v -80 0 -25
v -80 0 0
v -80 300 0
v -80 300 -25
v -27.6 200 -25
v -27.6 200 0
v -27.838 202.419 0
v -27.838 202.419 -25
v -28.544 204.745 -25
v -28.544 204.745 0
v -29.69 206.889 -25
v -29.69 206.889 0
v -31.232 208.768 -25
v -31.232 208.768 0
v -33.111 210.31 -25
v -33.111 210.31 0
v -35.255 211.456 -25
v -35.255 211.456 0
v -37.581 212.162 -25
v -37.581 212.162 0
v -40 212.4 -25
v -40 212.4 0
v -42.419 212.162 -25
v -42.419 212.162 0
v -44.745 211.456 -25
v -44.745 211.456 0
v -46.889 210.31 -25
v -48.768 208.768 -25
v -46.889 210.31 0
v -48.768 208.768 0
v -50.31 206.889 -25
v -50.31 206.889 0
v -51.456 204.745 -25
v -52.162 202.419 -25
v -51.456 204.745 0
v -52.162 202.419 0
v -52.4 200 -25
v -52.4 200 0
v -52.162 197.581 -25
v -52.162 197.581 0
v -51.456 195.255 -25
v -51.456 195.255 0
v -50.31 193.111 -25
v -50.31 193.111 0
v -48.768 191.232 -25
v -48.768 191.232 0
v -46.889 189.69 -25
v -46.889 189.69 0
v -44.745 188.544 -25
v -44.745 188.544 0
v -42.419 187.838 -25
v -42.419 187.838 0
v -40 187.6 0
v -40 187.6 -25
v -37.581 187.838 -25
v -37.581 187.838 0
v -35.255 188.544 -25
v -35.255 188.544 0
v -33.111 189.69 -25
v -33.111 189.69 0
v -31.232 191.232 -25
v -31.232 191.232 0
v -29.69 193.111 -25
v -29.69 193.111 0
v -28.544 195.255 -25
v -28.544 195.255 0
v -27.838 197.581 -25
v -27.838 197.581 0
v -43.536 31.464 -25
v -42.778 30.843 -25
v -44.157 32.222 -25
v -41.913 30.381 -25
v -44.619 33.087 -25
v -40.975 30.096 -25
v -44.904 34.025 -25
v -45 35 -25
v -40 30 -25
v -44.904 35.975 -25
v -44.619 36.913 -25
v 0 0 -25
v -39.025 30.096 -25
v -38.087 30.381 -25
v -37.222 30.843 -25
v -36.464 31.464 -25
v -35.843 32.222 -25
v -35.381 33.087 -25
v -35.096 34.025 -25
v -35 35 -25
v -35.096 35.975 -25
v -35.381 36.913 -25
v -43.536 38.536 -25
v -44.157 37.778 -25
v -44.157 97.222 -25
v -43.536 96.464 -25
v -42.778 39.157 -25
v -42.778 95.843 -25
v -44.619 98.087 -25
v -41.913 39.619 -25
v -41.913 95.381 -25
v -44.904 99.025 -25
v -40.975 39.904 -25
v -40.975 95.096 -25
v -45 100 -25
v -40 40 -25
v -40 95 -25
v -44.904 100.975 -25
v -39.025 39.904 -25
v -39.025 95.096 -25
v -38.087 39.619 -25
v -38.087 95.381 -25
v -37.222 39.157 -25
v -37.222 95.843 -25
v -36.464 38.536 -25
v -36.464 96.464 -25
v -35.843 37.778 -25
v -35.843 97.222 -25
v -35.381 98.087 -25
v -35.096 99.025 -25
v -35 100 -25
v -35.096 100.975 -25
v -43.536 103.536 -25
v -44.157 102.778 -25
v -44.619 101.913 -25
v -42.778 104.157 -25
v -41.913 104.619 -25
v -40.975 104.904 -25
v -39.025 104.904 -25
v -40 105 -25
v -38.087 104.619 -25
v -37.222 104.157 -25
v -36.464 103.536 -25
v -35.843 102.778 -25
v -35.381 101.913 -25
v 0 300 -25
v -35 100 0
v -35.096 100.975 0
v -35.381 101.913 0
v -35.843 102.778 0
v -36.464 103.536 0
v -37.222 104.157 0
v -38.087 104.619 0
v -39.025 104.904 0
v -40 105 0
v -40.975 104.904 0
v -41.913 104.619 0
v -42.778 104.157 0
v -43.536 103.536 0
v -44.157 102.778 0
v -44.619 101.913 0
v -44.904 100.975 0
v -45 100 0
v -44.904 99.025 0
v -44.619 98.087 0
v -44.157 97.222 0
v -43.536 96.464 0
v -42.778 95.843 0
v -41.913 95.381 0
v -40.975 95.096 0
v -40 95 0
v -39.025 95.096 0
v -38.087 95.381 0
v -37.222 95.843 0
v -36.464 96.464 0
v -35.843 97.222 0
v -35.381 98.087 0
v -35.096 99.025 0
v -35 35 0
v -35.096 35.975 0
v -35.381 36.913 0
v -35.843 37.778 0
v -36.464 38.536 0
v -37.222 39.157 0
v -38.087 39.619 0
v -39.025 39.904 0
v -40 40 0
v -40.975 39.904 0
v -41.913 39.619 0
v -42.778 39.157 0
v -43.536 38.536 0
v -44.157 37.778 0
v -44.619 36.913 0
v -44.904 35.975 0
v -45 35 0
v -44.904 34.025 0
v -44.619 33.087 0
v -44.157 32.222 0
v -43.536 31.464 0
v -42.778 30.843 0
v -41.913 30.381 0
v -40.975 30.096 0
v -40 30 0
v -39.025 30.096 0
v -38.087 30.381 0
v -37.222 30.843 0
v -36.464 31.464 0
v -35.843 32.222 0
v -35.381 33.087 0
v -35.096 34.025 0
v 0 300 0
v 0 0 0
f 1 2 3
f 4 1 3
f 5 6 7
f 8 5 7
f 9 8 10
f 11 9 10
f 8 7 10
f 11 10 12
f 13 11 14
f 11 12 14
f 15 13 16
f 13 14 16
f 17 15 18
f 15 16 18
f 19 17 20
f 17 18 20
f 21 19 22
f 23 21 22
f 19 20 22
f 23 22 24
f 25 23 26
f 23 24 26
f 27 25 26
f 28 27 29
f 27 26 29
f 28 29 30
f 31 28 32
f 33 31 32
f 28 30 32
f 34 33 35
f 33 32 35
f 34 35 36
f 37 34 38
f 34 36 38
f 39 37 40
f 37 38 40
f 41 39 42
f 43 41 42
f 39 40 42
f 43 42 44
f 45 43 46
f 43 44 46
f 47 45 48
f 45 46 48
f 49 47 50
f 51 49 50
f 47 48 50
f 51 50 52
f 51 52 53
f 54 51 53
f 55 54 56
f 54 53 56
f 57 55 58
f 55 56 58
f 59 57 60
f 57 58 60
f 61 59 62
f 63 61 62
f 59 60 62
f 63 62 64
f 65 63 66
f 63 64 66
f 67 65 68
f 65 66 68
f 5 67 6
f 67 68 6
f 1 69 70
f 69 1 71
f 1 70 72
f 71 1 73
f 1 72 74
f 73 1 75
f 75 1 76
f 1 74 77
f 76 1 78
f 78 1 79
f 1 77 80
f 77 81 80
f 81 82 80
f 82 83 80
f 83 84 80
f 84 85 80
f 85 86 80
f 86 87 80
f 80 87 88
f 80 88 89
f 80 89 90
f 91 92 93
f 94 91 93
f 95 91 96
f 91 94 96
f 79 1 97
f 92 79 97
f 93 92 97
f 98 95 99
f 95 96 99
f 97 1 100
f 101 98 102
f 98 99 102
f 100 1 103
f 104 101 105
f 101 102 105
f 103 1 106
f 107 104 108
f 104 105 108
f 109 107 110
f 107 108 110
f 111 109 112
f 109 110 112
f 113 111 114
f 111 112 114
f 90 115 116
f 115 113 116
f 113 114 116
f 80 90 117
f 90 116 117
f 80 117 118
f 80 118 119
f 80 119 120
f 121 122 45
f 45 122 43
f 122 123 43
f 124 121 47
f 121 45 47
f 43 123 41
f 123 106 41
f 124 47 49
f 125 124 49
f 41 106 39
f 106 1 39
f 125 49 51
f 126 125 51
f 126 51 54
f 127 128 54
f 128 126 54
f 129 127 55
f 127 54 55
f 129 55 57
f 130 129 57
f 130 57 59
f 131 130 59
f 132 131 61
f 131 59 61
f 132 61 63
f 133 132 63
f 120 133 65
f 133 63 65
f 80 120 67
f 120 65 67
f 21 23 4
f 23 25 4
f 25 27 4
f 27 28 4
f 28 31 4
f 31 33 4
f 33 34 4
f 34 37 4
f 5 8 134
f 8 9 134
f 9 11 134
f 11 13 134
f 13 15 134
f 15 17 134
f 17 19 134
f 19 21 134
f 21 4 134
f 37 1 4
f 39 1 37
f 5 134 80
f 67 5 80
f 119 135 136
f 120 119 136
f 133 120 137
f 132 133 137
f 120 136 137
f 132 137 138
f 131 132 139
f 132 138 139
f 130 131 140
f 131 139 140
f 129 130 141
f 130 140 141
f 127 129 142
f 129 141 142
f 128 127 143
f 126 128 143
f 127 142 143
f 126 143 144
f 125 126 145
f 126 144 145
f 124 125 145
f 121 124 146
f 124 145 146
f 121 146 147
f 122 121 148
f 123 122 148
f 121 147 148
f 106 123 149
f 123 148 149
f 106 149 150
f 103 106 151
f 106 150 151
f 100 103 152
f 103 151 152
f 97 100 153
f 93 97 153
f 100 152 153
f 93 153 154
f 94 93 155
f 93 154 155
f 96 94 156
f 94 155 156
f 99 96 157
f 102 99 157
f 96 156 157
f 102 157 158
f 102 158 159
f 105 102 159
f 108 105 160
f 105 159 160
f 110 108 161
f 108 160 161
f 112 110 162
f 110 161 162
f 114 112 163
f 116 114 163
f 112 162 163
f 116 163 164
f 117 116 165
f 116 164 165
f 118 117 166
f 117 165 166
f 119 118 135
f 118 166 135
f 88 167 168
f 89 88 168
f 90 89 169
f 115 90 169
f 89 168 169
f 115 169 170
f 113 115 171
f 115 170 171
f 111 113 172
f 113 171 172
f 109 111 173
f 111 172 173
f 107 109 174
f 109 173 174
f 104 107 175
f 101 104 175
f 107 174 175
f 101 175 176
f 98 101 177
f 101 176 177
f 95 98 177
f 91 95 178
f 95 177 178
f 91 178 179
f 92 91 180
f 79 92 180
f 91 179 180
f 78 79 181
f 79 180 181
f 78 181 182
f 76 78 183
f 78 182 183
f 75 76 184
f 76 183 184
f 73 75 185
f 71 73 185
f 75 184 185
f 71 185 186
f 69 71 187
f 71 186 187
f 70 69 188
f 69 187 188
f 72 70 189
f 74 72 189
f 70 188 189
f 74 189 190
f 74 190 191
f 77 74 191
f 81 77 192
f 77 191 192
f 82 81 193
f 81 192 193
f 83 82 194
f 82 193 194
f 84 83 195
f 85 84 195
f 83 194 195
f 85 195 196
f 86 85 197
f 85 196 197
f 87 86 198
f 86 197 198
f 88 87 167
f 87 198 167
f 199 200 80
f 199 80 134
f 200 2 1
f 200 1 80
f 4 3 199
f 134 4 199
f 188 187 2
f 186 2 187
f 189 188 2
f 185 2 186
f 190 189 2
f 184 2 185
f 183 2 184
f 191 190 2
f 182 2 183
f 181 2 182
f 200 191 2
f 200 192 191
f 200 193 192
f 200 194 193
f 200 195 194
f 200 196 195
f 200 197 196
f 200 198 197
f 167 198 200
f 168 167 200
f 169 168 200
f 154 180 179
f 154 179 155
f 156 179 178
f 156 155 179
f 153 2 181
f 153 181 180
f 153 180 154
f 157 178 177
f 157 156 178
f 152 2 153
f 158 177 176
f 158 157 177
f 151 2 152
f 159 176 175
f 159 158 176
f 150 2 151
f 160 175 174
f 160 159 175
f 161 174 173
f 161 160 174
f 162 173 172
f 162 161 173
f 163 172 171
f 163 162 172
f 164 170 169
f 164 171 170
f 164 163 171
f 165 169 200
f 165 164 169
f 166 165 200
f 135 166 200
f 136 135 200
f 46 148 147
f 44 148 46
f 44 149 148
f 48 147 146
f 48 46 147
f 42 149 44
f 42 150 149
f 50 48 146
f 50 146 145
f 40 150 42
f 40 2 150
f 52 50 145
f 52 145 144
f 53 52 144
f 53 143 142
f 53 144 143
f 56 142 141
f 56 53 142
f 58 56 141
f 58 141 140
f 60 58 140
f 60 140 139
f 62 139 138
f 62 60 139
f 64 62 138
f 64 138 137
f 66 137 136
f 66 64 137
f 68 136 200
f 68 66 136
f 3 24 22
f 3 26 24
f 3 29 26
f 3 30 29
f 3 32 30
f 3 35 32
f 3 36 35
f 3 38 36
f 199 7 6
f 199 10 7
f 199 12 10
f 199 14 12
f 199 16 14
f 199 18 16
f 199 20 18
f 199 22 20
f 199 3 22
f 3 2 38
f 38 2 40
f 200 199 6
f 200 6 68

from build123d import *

# Parameters (mm, degrees)
SKETCH1_W           = 80
SKETCH1_H           = 300
SKETCH1_R           = 12.4
SKETCH1_R_2         = 5
BOSS_EXTRUDE2_DEPTH = 25


with BuildPart() as part:
    # Sketch1 → Boss-Extrude2 (new body)
    with BuildSketch(Plane.XY):
        with Locations((-40, 150)):
            Rectangle(SKETCH1_W, SKETCH1_H)
        with Locations((-40, 200)):
            Circle(SKETCH1_R, mode=Mode.SUBTRACT)
        with Locations((-40, 35)):
            Circle(SKETCH1_R_2, mode=Mode.SUBTRACT)
        with Locations((-40, 100)):
            Circle(SKETCH1_R_2, mode=Mode.SUBTRACT)
    extrude(amount=-BOSS_EXTRUDE2_DEPTH)


solid = part.part
